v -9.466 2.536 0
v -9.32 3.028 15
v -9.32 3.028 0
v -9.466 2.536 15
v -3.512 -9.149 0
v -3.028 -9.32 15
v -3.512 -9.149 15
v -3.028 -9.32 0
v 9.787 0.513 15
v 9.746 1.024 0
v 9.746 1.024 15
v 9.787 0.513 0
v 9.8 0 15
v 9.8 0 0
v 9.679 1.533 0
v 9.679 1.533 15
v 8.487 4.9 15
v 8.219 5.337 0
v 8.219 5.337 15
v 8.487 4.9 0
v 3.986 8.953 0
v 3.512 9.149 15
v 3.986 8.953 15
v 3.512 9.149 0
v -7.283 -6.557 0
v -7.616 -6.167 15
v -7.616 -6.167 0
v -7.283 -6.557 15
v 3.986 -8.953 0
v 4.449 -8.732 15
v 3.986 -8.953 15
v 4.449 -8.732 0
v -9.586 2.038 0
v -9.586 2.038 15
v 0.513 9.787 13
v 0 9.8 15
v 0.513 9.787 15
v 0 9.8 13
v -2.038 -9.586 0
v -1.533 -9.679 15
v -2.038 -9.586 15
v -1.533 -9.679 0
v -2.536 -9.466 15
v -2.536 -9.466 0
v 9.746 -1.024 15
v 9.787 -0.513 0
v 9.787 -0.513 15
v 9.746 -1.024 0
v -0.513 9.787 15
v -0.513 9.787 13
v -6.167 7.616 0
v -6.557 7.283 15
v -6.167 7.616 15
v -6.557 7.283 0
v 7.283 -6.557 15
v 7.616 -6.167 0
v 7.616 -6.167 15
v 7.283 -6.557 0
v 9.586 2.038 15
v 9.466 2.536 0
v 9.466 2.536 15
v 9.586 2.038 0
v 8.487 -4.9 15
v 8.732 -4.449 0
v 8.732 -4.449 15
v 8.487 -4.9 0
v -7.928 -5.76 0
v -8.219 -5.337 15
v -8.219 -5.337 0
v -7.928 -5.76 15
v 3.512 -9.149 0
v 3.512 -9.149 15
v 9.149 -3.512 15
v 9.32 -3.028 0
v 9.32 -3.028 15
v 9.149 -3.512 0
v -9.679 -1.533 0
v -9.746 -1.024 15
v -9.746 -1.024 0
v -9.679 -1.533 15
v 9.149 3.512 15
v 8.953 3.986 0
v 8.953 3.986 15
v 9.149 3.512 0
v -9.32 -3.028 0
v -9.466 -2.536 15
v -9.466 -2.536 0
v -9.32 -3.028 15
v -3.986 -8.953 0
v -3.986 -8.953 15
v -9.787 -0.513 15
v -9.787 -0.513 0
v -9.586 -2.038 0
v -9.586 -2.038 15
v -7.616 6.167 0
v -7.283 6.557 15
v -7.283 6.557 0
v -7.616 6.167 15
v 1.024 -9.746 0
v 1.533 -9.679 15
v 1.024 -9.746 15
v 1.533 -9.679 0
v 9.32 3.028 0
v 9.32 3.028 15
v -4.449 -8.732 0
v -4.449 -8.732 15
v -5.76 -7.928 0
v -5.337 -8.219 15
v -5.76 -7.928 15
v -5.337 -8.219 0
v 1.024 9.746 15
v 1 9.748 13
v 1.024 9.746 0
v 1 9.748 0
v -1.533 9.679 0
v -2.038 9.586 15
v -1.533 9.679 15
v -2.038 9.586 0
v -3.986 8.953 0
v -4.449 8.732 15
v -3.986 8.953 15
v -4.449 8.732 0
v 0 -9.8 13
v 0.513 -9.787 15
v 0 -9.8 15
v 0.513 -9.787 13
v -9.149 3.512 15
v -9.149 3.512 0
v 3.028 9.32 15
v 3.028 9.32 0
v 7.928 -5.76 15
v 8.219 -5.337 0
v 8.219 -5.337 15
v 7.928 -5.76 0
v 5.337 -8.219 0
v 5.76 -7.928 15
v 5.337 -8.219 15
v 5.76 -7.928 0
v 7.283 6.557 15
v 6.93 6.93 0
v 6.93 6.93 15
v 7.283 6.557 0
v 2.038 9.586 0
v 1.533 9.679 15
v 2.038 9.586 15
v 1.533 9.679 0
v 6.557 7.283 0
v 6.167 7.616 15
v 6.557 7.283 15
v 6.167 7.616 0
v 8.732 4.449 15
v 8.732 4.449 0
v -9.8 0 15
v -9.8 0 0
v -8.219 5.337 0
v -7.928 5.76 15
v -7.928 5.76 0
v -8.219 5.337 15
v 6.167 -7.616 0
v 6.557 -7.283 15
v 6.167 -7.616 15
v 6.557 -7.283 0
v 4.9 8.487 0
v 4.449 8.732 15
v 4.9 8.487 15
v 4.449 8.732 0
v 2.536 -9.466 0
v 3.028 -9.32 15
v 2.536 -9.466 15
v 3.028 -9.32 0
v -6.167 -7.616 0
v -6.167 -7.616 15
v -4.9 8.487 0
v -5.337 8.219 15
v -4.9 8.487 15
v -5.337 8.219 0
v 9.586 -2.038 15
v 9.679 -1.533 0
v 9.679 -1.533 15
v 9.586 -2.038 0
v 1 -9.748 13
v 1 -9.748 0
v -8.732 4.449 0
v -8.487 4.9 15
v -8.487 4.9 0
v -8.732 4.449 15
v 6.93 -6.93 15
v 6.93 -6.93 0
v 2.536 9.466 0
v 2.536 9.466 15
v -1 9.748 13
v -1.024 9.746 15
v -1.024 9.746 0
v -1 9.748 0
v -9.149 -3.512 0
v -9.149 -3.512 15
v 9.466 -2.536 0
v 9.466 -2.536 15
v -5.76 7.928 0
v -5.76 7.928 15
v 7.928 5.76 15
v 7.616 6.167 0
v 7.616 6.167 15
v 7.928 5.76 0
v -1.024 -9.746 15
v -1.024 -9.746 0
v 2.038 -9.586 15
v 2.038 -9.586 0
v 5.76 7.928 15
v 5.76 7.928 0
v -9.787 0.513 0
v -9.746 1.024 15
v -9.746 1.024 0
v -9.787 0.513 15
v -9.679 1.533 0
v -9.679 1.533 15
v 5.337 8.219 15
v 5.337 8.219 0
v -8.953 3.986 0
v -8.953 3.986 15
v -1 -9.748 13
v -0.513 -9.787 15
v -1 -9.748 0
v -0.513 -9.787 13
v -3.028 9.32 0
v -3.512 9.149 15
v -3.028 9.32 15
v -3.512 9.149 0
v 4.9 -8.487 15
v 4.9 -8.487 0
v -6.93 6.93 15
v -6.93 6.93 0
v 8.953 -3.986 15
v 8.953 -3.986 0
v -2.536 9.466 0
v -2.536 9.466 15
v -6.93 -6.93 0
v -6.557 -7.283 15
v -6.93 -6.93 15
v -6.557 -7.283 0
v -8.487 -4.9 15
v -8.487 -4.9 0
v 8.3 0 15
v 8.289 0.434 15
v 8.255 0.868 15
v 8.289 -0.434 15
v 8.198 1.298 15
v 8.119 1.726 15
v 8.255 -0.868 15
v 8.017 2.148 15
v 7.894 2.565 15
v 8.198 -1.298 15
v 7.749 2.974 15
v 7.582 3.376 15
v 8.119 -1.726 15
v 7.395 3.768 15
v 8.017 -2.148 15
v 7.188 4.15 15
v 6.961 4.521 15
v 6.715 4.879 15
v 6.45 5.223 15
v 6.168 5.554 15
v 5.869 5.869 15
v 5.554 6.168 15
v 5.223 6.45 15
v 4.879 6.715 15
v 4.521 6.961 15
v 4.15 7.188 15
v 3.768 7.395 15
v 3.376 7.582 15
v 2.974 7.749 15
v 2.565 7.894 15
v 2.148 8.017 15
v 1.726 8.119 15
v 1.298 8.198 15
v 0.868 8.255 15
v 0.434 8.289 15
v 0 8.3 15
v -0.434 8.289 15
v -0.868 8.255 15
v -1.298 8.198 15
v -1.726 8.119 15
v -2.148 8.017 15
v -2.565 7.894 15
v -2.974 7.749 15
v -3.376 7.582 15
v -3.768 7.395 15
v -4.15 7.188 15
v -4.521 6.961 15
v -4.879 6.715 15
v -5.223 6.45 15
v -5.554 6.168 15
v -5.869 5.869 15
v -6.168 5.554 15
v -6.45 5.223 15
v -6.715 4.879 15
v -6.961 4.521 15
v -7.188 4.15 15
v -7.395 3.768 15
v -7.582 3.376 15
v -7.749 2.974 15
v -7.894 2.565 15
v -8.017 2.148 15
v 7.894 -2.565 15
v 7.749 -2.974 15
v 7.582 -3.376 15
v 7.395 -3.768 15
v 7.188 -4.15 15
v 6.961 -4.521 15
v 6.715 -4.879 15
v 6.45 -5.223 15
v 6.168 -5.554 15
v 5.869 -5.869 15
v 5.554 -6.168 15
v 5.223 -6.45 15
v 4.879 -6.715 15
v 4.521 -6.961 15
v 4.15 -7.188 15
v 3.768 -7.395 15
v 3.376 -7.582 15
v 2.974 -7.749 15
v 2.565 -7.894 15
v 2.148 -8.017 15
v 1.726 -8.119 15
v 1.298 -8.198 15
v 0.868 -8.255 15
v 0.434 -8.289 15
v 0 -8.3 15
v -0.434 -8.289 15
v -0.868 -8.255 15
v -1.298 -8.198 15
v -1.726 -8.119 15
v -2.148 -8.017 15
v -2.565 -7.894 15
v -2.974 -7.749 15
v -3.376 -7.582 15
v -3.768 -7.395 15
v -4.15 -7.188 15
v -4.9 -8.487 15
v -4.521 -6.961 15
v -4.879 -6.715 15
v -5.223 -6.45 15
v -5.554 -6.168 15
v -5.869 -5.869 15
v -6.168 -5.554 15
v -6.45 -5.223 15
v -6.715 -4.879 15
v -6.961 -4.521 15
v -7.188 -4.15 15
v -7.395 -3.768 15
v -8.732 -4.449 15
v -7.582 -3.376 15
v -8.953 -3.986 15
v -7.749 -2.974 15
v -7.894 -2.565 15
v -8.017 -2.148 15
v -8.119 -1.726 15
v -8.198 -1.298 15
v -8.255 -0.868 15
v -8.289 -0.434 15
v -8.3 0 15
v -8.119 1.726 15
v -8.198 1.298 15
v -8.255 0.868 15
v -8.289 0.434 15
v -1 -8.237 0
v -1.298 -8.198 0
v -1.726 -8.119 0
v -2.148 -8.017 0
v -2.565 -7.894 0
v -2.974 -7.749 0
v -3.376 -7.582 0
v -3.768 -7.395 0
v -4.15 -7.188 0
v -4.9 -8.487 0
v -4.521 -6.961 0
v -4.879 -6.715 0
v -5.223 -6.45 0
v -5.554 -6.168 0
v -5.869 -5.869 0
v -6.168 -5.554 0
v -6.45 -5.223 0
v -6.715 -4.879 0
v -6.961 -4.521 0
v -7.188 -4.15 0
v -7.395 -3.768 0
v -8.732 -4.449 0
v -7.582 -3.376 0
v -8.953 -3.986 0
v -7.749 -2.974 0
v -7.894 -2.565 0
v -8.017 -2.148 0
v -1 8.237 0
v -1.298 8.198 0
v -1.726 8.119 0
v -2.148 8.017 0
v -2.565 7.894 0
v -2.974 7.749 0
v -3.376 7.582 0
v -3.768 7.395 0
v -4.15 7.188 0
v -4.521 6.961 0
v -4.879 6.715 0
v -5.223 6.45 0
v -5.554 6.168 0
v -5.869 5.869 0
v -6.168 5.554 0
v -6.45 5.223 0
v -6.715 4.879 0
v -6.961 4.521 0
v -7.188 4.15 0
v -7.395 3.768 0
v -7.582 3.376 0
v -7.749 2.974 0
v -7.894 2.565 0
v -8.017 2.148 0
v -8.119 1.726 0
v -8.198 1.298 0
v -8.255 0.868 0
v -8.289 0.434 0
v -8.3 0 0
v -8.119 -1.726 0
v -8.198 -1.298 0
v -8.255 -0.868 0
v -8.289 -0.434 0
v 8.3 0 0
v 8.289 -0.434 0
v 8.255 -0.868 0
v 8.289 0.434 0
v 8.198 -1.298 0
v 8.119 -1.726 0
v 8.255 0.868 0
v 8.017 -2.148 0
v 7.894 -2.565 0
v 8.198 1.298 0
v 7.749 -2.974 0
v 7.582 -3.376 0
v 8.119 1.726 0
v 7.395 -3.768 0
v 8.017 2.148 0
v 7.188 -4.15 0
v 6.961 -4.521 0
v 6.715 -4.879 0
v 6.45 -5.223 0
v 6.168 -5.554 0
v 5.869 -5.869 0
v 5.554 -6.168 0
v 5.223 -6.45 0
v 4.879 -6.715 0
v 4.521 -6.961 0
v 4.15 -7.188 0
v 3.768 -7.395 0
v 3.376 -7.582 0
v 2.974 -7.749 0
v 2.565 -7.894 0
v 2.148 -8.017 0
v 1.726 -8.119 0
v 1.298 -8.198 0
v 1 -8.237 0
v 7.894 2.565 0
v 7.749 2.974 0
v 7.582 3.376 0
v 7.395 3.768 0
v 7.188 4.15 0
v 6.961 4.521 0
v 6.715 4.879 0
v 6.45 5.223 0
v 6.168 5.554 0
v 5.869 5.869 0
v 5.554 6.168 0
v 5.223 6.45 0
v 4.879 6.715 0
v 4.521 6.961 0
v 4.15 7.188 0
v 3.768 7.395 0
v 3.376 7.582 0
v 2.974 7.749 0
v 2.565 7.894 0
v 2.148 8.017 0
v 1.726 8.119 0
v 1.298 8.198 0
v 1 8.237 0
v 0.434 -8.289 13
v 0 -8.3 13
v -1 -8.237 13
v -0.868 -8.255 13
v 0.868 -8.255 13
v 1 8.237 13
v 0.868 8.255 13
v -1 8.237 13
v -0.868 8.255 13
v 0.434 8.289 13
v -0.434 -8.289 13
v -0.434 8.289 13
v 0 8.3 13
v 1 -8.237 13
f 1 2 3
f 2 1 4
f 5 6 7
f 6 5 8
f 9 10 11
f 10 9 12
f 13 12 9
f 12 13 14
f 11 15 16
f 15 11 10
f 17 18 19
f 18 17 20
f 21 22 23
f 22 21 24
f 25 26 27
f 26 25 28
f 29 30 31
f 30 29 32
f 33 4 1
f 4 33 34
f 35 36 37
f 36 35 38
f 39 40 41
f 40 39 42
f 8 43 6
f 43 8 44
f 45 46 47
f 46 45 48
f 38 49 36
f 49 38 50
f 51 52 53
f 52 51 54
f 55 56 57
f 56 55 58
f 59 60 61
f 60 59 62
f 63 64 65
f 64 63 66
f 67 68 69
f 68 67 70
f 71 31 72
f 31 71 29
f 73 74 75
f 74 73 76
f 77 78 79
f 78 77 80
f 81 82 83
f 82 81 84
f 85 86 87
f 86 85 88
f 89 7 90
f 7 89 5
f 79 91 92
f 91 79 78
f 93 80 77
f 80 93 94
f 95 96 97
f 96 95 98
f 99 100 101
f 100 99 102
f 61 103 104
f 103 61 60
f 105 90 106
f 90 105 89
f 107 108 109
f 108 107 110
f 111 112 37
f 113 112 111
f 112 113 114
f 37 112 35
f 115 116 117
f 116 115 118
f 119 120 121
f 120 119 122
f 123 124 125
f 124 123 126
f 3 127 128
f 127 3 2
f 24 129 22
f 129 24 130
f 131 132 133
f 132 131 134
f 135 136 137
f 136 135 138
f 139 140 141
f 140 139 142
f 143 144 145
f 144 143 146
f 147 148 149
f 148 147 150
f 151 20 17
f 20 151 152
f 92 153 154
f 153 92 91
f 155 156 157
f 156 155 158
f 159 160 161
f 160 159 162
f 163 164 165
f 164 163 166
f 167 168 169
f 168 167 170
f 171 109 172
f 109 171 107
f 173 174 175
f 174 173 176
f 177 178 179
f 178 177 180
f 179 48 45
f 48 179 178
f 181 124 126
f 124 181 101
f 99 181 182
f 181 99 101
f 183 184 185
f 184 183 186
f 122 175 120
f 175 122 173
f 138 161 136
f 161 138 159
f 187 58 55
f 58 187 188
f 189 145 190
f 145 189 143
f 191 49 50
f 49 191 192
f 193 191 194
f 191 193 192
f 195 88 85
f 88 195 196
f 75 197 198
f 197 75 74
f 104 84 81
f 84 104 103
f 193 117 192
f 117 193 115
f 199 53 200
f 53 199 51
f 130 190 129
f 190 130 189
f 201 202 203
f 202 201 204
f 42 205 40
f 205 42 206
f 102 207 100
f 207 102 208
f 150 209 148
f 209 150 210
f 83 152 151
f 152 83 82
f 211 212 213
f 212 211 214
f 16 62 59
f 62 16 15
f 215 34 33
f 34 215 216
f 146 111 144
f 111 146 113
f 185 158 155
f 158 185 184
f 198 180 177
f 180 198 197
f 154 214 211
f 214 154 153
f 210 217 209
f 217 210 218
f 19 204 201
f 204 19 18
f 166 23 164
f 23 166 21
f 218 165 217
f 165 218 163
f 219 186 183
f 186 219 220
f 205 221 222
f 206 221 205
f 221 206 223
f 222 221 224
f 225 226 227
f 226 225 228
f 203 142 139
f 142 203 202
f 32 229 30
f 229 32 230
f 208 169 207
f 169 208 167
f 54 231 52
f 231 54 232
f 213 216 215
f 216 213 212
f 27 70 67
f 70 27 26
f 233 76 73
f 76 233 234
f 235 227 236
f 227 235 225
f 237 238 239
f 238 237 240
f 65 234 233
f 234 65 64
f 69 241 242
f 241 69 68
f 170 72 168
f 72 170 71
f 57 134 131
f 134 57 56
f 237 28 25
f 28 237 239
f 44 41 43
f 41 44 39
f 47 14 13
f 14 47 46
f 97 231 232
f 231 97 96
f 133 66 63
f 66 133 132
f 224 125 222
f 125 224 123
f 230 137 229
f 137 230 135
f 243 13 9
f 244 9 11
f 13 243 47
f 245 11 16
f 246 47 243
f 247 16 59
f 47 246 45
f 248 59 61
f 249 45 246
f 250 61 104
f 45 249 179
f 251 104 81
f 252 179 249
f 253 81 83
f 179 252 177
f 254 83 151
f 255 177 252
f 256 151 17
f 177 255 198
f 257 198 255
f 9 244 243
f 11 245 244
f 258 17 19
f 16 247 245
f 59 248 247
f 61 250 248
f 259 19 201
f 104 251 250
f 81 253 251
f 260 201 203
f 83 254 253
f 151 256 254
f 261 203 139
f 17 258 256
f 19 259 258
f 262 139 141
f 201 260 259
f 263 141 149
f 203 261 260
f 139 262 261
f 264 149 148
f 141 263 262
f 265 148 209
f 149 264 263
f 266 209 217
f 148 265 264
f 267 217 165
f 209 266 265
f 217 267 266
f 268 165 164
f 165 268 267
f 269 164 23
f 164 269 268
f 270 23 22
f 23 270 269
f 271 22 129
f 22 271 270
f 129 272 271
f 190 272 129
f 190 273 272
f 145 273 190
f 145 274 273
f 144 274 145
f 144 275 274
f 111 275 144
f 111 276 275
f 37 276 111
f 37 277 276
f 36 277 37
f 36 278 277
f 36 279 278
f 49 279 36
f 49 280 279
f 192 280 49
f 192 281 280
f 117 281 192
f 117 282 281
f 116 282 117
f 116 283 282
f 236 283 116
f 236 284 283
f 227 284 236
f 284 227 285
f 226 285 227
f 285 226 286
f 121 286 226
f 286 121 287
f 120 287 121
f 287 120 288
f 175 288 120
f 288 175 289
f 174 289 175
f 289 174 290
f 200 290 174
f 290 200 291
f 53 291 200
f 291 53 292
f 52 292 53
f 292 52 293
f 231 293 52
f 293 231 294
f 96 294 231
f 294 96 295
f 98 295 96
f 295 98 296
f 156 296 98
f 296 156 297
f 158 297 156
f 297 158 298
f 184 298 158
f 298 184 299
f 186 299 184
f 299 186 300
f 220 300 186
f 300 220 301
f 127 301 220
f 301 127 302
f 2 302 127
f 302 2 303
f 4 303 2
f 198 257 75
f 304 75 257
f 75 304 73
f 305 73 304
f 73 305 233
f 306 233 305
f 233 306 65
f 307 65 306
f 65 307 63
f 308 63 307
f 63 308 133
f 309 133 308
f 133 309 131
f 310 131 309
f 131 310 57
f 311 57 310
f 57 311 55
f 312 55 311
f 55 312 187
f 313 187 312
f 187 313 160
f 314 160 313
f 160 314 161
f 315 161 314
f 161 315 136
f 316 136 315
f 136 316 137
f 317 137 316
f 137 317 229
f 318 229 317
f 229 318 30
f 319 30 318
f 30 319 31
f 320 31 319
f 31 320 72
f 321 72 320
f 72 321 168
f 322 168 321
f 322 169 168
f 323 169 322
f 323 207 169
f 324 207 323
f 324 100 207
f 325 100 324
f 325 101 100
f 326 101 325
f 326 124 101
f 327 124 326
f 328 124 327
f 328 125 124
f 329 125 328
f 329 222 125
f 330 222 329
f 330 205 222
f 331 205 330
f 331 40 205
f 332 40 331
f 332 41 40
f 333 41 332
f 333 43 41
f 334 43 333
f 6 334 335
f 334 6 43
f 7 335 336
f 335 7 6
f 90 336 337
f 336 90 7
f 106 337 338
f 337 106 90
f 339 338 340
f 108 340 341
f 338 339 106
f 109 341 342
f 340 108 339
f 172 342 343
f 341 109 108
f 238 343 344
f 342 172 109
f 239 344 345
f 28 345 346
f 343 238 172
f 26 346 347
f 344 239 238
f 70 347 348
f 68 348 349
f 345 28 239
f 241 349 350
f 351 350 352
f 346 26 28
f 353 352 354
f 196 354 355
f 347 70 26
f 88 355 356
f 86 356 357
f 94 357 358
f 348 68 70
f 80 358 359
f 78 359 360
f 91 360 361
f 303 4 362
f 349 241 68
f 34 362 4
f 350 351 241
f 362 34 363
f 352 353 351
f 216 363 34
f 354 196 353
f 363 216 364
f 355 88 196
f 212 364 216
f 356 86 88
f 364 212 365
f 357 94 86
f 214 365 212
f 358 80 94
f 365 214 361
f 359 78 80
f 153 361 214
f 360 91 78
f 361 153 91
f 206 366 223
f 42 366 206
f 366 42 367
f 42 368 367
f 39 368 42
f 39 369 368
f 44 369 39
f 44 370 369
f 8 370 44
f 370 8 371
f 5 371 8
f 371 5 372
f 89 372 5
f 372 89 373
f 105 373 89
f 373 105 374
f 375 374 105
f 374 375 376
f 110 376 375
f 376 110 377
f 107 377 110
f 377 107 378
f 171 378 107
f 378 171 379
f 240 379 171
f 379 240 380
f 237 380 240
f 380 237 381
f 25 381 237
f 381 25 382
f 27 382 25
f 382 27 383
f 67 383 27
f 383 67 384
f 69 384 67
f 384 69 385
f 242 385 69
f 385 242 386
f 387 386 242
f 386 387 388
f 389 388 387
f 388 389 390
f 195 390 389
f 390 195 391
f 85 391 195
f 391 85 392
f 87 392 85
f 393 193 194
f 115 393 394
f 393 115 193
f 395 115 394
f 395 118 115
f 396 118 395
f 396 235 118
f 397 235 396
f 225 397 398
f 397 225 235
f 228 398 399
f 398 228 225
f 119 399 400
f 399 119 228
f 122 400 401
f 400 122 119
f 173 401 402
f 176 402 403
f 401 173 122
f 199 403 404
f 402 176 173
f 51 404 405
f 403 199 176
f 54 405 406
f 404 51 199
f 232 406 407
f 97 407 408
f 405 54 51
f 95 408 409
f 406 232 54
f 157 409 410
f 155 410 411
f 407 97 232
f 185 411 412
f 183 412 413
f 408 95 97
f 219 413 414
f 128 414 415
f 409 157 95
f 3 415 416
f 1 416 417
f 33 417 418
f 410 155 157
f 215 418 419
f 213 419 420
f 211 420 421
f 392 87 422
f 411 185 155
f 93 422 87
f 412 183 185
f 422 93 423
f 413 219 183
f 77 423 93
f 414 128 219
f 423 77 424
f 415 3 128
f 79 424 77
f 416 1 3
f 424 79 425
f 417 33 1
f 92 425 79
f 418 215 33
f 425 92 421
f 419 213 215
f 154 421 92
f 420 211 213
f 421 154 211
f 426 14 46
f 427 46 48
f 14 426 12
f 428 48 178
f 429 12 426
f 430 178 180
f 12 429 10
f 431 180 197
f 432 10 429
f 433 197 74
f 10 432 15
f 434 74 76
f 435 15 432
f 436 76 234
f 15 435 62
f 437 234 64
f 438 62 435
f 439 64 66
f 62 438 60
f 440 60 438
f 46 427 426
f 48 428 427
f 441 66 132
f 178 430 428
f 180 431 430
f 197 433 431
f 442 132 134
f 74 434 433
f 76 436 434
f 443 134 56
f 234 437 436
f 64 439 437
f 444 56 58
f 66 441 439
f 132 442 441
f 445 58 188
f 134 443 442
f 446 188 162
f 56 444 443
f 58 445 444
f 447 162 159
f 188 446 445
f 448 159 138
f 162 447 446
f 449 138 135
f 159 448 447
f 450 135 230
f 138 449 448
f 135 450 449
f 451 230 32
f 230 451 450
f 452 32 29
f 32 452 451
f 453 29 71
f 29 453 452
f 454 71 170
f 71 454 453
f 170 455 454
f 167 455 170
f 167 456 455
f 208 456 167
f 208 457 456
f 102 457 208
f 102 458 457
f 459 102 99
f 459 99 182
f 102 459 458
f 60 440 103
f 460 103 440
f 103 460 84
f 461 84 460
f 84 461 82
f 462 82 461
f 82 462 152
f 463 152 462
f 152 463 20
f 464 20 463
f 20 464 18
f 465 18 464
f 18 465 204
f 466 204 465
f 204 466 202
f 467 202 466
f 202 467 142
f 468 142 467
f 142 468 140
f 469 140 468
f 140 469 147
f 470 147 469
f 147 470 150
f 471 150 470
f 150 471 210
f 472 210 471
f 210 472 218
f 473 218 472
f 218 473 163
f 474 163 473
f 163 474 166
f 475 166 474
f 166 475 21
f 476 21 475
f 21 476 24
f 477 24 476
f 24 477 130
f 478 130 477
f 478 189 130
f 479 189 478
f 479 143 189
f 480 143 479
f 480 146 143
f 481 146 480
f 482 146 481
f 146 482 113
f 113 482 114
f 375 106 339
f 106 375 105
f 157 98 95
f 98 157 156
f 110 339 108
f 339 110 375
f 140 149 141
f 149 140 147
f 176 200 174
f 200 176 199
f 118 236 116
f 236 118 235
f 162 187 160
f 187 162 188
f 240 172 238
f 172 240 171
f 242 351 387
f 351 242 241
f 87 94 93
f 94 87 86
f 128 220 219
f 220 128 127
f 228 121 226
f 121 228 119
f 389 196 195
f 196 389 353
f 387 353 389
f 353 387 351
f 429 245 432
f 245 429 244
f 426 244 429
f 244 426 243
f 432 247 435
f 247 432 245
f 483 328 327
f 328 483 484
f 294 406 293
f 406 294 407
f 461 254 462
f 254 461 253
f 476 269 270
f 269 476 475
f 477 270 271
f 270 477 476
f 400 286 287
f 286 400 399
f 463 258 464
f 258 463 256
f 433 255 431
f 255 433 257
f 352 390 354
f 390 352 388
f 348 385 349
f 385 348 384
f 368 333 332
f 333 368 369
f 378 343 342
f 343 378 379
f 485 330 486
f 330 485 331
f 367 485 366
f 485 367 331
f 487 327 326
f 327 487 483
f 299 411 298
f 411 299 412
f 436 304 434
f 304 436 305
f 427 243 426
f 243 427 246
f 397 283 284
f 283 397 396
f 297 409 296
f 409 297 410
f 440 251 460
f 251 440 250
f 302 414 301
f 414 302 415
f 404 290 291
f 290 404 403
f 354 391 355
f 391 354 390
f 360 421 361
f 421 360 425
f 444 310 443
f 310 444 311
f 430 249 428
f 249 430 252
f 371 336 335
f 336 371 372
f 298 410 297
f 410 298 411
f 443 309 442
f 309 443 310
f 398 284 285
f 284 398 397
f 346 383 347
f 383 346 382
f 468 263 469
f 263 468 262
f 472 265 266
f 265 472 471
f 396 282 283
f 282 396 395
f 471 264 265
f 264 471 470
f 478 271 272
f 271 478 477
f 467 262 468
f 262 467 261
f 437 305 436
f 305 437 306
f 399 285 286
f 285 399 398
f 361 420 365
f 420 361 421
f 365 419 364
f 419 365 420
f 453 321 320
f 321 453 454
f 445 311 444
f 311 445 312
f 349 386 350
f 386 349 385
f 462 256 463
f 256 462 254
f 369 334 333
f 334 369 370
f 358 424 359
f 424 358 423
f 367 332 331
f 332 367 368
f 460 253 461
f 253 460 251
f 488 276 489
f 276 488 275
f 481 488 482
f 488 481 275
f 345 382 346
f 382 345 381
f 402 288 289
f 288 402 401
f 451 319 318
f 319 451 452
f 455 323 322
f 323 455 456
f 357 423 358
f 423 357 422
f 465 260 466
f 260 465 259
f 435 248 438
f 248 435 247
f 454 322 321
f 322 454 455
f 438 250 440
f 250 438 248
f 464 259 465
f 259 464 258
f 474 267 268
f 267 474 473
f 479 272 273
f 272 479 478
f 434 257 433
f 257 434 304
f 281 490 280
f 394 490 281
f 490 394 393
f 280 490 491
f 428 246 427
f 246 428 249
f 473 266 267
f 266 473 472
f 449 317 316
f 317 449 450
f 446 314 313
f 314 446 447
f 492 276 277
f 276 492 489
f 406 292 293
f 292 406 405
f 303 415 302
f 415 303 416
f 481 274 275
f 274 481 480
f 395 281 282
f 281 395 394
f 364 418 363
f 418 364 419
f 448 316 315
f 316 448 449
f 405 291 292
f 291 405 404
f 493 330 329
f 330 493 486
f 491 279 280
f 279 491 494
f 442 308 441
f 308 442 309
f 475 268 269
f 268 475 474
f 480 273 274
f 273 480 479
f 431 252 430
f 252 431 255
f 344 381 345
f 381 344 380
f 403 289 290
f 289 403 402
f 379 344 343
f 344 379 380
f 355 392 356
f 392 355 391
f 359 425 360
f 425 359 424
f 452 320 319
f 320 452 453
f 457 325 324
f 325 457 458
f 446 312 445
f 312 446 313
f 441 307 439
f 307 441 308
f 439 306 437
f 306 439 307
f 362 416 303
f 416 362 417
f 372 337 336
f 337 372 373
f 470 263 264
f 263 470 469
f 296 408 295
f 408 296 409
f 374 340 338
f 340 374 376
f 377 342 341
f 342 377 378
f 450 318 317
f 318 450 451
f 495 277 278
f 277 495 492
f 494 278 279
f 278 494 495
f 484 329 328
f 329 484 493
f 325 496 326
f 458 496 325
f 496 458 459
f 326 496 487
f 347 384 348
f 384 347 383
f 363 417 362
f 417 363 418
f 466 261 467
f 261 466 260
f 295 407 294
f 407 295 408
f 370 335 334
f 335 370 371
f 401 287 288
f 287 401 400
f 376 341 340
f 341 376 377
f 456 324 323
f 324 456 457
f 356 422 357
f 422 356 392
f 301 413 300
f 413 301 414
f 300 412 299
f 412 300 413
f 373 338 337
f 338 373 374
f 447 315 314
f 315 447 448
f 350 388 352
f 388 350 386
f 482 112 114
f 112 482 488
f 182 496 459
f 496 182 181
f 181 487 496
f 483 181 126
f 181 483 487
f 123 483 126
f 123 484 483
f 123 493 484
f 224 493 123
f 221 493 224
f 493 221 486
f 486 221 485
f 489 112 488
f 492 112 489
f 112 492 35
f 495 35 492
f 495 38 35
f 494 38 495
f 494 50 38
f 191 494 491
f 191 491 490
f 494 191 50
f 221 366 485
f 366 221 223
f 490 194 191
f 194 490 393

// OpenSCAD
$fn = 120;

DZ_PCB = 13;
DZ_EXTRA = 2;
DZ = DZ_PCB + DZ_EXTRA;

D = 20 - 0.4;
T = 3;
T_PCB = 2;

difference()
{
    cylinder(h=DZ, d=D);
    cylinder(h=DZ, d=D - T);
    translate([-T_PCB/2, -20, 0]) cube(size=[T_PCB, 40, DZ_PCB]);
}
